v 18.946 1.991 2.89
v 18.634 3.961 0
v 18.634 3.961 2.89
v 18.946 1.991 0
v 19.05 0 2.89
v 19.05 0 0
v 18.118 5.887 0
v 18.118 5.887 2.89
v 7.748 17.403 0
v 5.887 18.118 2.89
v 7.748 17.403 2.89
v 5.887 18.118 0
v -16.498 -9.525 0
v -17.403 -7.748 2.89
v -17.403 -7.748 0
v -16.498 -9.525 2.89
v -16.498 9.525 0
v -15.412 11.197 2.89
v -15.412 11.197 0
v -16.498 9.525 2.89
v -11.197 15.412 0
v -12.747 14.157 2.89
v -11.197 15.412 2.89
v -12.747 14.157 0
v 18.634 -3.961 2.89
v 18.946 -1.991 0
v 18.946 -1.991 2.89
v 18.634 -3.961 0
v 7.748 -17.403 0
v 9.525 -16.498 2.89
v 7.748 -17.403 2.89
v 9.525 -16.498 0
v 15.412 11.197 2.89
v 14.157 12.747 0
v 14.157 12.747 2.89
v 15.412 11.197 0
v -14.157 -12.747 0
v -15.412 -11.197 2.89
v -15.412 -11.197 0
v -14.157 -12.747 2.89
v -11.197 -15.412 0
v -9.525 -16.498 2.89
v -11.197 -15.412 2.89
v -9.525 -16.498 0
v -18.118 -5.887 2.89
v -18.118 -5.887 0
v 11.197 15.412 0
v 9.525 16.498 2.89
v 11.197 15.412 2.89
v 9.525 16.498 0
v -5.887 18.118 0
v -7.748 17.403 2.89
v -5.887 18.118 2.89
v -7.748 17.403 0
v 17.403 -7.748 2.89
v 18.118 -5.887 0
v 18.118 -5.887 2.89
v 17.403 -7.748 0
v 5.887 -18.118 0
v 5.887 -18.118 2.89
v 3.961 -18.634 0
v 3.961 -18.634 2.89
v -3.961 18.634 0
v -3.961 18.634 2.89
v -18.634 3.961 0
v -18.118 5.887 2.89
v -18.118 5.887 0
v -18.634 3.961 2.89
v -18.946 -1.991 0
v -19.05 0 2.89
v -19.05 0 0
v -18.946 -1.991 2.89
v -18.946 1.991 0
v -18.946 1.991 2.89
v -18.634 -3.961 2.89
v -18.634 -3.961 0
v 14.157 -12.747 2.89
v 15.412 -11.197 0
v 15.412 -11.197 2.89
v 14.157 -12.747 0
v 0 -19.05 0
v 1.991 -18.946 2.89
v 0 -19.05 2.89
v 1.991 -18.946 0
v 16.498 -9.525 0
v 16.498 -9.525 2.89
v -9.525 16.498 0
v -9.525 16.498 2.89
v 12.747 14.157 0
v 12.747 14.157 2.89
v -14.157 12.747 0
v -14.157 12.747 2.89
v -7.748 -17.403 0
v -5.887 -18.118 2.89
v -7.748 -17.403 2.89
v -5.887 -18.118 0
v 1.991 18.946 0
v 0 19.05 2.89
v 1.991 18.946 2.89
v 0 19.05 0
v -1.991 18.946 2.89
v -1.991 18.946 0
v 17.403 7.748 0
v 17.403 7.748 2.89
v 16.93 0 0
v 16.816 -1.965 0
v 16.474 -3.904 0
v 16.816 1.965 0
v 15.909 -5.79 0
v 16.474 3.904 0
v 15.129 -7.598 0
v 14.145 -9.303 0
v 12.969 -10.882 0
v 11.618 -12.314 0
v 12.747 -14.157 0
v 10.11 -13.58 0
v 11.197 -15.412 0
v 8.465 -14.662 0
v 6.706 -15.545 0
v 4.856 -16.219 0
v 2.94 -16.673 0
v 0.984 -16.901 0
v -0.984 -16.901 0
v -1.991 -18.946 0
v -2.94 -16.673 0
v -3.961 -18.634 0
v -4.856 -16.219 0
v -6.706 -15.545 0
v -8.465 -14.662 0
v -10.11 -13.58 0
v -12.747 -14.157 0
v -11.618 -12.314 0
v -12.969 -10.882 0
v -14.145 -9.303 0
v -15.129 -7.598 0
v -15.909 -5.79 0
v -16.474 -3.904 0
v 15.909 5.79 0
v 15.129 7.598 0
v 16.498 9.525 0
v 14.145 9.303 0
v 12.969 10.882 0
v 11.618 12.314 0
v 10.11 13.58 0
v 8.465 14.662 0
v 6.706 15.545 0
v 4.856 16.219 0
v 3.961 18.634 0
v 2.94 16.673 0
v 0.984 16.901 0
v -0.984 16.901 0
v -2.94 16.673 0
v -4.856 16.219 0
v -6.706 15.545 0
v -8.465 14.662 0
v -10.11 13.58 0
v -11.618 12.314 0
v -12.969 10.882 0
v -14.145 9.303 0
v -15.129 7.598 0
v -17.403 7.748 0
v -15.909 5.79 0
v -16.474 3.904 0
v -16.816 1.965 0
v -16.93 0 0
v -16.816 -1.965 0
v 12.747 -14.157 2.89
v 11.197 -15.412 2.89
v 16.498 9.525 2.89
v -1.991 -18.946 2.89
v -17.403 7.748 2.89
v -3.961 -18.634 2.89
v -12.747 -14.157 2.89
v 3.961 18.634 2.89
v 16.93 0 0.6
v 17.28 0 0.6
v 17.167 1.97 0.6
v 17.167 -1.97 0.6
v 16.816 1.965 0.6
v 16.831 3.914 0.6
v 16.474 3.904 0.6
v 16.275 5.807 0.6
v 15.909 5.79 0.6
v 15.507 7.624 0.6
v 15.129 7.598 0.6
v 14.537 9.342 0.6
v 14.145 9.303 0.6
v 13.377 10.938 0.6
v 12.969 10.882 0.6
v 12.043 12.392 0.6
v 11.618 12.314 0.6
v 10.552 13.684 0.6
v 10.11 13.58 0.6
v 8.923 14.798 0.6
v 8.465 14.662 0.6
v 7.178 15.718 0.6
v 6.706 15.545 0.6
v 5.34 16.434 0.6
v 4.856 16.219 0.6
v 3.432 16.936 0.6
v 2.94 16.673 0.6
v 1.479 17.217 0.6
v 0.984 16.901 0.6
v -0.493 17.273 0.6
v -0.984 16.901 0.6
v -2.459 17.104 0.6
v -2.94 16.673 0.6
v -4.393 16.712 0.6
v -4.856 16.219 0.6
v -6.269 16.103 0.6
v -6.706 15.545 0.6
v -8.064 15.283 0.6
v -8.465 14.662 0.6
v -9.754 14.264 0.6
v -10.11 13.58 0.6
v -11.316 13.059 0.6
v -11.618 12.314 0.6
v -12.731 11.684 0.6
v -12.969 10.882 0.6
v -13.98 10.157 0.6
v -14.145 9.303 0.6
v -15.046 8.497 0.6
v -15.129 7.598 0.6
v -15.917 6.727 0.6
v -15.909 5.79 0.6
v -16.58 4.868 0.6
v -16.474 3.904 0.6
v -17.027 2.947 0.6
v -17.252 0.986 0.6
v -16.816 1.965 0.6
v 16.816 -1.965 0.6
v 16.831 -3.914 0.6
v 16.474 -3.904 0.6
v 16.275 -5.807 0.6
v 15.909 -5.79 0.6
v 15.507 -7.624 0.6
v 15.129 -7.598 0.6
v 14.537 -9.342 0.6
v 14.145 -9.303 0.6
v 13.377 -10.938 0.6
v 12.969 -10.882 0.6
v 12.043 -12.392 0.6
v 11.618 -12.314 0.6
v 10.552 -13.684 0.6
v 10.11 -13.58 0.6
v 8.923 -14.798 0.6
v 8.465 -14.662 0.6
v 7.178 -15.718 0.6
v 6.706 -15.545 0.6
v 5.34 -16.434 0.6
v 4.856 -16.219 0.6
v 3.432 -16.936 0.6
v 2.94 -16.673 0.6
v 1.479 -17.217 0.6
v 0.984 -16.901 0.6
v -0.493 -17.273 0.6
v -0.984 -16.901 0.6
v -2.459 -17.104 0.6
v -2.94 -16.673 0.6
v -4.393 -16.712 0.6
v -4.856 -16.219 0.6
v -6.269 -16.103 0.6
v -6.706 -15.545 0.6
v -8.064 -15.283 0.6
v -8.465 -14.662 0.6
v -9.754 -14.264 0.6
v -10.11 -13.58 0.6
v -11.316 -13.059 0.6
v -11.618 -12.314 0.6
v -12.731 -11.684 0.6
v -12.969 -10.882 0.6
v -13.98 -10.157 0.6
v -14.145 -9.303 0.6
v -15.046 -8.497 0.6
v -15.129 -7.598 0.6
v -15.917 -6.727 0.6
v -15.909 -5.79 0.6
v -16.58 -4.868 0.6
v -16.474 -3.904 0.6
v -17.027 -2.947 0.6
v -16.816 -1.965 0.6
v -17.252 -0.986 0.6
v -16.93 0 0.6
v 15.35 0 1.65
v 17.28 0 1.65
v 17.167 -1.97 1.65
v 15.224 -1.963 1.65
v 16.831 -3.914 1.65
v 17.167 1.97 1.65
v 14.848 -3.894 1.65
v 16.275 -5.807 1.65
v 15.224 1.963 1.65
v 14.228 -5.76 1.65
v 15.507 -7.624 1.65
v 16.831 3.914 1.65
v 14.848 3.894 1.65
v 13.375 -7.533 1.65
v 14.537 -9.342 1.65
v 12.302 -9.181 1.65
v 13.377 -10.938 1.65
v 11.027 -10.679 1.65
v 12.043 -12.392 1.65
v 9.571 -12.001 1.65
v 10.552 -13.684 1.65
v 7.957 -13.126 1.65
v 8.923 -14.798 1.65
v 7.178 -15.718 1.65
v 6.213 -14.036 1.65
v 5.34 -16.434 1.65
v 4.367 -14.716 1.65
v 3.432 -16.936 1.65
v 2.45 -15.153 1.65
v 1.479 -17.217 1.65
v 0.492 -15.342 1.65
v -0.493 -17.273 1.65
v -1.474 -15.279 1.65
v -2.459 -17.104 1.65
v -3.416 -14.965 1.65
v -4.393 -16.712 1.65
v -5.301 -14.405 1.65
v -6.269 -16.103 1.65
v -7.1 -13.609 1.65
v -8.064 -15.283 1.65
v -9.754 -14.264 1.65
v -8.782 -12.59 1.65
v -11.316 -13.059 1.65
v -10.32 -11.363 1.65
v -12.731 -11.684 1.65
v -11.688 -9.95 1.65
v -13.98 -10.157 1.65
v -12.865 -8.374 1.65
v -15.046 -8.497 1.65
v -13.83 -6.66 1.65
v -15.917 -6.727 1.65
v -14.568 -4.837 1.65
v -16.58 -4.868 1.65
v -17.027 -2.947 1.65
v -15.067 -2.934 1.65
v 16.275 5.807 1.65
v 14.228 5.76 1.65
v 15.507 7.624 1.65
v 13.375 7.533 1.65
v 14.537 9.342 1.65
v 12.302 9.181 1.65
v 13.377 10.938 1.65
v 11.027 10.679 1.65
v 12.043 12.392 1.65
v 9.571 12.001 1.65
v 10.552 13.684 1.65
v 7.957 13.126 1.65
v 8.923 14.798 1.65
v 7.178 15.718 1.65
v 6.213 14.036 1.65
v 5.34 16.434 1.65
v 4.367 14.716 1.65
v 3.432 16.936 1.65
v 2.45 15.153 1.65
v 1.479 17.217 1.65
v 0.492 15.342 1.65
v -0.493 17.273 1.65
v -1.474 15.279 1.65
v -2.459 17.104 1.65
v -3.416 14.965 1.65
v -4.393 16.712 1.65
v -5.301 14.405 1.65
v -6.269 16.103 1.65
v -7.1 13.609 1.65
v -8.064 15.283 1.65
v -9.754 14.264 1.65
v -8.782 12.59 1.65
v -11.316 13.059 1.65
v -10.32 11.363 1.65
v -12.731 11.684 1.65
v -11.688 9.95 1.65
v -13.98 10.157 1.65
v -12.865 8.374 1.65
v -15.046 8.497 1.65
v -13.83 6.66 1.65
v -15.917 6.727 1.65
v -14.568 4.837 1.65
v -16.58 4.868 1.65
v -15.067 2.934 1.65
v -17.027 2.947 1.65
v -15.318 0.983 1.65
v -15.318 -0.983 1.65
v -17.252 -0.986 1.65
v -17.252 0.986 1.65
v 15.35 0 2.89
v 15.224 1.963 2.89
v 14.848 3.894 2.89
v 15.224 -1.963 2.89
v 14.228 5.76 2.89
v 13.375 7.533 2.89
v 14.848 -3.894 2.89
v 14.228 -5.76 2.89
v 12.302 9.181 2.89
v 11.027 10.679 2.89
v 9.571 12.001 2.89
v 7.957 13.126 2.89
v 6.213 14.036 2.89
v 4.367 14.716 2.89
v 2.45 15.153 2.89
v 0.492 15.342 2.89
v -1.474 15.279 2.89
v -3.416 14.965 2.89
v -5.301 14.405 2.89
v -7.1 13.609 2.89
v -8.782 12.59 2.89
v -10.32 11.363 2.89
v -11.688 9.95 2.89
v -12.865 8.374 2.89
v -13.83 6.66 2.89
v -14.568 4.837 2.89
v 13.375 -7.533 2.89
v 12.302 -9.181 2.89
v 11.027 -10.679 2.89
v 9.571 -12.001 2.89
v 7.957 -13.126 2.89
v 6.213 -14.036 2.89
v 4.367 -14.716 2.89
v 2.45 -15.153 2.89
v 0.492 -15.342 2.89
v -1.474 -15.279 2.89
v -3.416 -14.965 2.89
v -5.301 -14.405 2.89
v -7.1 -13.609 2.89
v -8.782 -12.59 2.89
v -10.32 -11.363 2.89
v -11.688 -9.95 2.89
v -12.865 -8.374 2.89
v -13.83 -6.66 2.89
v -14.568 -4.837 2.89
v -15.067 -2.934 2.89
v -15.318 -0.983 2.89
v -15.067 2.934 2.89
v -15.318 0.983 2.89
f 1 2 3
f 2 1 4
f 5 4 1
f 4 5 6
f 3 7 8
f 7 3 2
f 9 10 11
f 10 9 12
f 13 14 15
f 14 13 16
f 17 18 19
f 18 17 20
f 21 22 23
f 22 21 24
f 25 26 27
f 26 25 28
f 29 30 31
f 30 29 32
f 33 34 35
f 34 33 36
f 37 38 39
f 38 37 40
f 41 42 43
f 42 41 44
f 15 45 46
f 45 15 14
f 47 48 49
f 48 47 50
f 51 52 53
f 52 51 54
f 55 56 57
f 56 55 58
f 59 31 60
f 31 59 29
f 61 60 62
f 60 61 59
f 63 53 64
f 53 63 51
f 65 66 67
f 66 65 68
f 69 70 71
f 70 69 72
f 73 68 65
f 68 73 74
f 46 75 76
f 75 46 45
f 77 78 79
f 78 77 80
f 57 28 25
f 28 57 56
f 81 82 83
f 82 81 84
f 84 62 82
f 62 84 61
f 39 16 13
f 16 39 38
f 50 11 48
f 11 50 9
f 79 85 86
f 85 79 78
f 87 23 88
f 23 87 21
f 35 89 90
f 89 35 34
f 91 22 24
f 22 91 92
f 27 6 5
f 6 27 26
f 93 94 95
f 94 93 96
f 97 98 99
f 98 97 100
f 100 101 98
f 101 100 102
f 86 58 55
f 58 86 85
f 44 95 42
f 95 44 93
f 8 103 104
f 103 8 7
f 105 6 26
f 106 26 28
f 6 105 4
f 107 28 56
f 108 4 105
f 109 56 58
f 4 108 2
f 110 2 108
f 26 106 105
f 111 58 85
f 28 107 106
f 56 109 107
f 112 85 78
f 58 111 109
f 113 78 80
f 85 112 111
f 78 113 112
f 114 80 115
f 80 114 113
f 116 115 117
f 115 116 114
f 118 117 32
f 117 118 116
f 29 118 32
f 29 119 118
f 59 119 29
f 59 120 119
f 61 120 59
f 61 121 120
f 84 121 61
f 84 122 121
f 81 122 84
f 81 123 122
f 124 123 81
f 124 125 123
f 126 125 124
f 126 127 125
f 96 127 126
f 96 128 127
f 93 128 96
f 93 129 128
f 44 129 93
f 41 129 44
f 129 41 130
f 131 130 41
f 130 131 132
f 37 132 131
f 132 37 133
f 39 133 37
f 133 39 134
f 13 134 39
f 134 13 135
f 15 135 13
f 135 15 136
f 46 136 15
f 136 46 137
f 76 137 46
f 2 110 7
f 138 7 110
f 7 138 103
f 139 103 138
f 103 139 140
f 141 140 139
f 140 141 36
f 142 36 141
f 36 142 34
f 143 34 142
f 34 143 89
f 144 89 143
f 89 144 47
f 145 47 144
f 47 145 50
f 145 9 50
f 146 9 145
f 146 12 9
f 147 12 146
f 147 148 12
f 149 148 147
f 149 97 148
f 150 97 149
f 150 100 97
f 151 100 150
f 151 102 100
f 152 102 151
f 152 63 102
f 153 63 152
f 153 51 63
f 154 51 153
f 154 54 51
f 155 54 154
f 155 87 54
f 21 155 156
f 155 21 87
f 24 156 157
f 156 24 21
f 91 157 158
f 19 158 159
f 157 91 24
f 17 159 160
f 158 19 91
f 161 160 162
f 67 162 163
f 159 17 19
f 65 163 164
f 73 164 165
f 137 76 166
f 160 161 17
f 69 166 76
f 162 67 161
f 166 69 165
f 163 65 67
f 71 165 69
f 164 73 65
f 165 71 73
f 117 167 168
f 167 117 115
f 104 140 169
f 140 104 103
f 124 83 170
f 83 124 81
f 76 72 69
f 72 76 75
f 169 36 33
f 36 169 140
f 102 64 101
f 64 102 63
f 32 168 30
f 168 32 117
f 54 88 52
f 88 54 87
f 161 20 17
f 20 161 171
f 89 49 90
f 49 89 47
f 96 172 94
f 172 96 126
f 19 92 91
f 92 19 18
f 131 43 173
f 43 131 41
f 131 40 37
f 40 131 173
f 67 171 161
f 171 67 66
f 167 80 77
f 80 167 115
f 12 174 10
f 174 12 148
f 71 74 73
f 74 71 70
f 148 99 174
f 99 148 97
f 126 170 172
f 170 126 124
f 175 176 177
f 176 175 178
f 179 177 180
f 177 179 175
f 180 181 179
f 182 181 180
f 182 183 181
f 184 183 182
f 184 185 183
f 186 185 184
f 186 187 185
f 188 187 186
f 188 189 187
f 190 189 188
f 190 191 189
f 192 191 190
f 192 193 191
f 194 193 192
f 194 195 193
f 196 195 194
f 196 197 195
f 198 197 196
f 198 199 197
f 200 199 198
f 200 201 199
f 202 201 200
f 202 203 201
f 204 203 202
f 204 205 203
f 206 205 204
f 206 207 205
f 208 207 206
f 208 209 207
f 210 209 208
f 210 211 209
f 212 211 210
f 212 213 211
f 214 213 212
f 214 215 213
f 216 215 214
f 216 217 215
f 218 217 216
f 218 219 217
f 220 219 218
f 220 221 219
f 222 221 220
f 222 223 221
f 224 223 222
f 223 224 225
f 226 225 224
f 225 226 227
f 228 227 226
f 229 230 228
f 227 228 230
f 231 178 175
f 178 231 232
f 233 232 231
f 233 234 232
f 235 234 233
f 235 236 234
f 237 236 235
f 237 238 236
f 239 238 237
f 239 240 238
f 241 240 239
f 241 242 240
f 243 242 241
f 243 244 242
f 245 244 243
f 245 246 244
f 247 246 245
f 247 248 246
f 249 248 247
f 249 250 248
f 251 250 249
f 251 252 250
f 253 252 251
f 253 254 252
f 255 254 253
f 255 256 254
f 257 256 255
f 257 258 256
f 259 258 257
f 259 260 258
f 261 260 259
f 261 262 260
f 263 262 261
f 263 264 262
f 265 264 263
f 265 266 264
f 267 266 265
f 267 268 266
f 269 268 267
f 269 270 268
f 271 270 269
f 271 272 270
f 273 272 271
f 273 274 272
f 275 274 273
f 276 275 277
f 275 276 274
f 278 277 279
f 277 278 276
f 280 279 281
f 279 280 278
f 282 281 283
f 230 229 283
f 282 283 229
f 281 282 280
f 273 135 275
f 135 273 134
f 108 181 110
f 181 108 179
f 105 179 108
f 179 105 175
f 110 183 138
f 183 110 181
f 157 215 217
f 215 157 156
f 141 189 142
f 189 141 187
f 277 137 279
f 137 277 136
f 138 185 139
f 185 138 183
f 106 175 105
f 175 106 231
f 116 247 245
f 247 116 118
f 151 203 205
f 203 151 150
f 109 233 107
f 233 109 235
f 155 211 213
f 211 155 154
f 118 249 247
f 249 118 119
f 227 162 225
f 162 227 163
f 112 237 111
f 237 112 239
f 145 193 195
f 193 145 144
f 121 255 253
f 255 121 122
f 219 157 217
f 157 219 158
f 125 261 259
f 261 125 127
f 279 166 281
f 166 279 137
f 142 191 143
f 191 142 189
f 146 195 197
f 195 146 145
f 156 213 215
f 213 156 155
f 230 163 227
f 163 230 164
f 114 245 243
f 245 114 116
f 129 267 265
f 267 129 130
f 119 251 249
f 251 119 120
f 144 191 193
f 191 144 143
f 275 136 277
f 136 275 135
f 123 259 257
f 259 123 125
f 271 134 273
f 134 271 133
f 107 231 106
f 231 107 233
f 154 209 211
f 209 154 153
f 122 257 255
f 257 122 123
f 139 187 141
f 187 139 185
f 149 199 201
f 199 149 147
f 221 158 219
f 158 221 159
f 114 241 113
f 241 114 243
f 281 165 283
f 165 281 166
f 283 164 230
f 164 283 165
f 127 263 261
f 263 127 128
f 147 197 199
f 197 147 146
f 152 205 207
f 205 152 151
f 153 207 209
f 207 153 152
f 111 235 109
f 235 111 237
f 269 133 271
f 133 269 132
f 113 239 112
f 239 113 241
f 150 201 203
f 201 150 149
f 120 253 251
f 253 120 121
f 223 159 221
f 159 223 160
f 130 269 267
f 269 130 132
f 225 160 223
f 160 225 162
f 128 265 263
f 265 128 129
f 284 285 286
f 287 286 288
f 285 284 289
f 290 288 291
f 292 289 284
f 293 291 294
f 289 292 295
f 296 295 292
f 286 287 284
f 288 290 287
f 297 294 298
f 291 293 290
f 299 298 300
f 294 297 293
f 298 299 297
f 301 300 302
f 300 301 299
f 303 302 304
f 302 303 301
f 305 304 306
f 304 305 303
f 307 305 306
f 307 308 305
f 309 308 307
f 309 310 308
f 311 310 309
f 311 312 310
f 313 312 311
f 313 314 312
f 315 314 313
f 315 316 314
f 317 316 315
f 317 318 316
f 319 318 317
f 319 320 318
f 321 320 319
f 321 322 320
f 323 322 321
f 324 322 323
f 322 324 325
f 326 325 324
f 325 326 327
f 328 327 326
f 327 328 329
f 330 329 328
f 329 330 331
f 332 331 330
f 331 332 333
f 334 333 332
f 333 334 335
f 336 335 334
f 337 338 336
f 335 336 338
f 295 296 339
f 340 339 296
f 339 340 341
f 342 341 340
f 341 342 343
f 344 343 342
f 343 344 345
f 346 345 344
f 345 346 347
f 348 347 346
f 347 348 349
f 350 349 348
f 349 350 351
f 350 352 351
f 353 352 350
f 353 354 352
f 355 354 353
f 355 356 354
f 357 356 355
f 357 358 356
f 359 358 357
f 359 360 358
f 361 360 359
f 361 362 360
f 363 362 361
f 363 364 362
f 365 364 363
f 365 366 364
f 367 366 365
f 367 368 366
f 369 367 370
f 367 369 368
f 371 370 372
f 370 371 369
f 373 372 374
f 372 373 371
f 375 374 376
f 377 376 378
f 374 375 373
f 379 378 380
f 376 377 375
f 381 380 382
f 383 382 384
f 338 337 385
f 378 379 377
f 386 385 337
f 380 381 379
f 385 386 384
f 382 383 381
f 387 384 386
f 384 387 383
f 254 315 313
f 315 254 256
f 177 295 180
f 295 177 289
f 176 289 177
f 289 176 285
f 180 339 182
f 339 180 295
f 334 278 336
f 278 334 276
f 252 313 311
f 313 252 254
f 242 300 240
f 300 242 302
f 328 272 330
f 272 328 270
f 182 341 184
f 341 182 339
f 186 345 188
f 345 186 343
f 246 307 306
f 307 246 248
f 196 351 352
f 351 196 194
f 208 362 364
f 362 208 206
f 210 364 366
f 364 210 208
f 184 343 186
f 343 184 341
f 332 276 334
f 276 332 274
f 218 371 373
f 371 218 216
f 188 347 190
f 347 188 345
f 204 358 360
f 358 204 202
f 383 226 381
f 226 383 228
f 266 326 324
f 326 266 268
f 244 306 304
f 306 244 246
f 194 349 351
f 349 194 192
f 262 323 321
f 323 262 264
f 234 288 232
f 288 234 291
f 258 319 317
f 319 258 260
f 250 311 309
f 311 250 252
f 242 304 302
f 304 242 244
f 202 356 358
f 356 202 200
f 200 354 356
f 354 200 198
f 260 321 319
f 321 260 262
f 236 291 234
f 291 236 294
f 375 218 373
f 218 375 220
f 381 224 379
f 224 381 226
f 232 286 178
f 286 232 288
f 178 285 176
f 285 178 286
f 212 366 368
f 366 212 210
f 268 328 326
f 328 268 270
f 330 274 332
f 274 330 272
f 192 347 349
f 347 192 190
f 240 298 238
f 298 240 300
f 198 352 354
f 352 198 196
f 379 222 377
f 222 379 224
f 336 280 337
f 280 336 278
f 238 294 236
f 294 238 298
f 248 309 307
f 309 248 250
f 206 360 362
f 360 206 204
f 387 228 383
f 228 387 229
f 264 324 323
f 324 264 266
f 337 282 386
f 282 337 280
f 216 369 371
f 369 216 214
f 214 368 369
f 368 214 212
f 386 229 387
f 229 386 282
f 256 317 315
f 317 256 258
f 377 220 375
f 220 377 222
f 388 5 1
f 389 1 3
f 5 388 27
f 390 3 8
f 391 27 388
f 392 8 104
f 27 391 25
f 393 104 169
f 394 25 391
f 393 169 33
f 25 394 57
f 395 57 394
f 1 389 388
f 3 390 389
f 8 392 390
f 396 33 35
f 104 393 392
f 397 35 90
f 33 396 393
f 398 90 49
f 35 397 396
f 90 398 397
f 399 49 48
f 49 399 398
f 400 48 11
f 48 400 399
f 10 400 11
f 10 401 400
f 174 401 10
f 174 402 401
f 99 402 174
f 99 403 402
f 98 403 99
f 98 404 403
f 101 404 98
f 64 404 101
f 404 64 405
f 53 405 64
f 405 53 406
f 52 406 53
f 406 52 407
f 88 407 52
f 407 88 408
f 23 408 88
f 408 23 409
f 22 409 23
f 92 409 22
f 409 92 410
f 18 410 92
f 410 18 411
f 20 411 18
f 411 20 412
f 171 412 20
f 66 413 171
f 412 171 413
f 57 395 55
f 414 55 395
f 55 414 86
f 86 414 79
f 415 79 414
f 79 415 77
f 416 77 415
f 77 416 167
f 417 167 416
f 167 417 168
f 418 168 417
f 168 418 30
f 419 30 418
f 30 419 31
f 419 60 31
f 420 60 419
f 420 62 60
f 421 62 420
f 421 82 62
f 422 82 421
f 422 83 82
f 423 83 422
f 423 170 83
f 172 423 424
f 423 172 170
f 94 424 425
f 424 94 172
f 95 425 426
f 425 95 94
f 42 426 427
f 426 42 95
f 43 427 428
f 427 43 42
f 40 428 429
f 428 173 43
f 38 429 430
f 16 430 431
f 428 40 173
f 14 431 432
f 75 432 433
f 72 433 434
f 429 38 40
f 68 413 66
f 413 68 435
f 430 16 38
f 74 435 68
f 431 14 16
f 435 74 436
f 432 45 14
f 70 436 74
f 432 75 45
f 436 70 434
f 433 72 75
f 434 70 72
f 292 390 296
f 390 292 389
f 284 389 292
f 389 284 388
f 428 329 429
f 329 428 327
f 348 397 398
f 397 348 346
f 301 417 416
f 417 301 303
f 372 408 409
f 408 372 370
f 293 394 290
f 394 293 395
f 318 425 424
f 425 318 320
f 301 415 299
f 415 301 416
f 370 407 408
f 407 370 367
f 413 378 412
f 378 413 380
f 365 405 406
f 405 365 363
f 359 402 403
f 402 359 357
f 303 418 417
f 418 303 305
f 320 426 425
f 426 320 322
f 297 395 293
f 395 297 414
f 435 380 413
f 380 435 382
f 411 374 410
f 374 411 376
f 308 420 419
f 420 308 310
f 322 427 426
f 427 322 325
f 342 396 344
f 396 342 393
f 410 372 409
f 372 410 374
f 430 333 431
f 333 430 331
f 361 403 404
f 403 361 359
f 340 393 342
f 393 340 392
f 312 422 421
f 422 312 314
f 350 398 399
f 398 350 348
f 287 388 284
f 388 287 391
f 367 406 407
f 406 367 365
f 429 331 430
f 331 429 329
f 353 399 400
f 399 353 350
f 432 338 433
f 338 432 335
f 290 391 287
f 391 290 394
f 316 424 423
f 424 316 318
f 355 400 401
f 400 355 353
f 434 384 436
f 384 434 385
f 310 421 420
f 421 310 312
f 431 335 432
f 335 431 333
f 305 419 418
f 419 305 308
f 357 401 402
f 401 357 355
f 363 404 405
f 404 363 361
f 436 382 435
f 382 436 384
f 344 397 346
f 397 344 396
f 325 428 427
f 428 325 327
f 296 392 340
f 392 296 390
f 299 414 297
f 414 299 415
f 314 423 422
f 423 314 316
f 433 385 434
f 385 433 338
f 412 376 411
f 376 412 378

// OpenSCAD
// replacement bezel for a Timex 34320 10880

sigma = 0.01;
two_sigma = sigma * 2;
fit_clearance = 0.05;

// diameter of the clip, the widest part that the inside of the bezel touches
d2 = 34.56;


// diameter of the crystal
d3 = 30.65;

// diameter closest to the body
d1 = d2 - 2 * 0.35;

// height below the clip, towards the body
h1 = 0.60;

// height from the body to the top face
h2 = 1.65;

// height above the top face that the bezel's flat band ends
h3 = 1.24;

// diameter of flat face of body
d4= 38.10;


$fa = 0.01;

difference() {
  union() {
    cylinder(h1, d=d4);
  }
  translate([0,0, -sigma])
    cylinder(h1 + two_sigma, d=d1);
}

difference() {
  translate([0,0,h1])
    cylinder(h2-h1, d=d4);
  translate([0,0,h1 - sigma])
    cylinder(h2-h1+two_sigma, d=d2);
}

difference() {
  translate([0,0,h2])
    cylinder(h3, d=d4);
  translate([0,0,h2-sigma])
    cylinder(h3+two_sigma, d=d3+fit_clearance);
}
